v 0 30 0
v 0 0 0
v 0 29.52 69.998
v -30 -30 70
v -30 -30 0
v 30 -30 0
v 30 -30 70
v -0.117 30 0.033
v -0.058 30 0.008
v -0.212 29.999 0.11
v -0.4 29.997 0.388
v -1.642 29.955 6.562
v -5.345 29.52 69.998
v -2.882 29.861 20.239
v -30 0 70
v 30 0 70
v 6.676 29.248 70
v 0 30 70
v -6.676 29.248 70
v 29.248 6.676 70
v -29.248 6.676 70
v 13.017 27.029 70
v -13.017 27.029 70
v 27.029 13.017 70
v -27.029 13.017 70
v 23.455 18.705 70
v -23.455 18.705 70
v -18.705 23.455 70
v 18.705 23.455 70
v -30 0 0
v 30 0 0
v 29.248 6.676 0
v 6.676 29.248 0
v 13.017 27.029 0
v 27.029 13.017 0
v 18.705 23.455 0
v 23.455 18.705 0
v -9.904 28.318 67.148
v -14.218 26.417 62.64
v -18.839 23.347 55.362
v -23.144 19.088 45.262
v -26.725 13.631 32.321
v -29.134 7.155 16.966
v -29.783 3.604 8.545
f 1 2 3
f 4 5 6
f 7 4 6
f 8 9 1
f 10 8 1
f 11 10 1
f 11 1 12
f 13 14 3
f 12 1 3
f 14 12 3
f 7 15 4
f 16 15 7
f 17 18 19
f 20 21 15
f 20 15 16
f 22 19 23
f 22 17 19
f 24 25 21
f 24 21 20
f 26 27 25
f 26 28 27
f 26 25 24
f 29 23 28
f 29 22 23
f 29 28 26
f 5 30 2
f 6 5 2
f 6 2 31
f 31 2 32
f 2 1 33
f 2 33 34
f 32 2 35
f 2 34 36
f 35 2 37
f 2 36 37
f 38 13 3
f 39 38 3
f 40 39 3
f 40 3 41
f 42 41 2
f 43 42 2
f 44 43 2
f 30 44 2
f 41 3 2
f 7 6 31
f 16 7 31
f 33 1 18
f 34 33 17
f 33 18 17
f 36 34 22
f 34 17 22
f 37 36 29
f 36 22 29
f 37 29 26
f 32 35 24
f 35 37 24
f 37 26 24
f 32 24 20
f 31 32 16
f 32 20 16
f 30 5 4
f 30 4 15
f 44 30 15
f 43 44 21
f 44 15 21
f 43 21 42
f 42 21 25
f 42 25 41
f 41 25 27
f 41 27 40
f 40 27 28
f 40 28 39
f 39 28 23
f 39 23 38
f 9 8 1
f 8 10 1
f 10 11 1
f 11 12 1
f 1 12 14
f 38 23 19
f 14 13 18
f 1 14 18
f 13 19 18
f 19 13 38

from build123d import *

# Parameters (mm, degrees)
F0_W     = 60
F0_H     = 60
F1_DEPTH = 70
F3_DEPTH = 70.001
F5_DEPTH = 30.001


with BuildPart() as f1:
    # F0 (on Top) → F1 (new body)
    with BuildSketch(Plane.XY):
        Rectangle(F0_W, F0_H)
    extrude(amount=F1_DEPTH)

    # F2 (on face) → F3 (cut, through all)
    with BuildSketch(Plane.XY.offset(70)):
        with BuildLine():
            ThreePointArc((0, 30), (21.213203, 21.213203), (30, 0))
            Line((30, 0), (30, 30))
            Line((30, 30), (0, 30))
        make_face()
        with BuildLine():
            ThreePointArc((-30, 0), (-21.213203, 21.213203), (0, 30))
            Line((0, 30), (-30, 30))
            Line((-30, 30), (-30, 0))
        make_face()
    extrude(amount=-F3_DEPTH, mode=Mode.SUBTRACT)

    # F4 (on Right) → F5 (cut, through all)
    with BuildSketch(Plane.YZ):
        Polygon((30, 0), (29.520035, 69.998355), (0, 0), align=None)
    extrude(amount=-F5_DEPTH, mode=Mode.SUBTRACT)


solid = f1.part
